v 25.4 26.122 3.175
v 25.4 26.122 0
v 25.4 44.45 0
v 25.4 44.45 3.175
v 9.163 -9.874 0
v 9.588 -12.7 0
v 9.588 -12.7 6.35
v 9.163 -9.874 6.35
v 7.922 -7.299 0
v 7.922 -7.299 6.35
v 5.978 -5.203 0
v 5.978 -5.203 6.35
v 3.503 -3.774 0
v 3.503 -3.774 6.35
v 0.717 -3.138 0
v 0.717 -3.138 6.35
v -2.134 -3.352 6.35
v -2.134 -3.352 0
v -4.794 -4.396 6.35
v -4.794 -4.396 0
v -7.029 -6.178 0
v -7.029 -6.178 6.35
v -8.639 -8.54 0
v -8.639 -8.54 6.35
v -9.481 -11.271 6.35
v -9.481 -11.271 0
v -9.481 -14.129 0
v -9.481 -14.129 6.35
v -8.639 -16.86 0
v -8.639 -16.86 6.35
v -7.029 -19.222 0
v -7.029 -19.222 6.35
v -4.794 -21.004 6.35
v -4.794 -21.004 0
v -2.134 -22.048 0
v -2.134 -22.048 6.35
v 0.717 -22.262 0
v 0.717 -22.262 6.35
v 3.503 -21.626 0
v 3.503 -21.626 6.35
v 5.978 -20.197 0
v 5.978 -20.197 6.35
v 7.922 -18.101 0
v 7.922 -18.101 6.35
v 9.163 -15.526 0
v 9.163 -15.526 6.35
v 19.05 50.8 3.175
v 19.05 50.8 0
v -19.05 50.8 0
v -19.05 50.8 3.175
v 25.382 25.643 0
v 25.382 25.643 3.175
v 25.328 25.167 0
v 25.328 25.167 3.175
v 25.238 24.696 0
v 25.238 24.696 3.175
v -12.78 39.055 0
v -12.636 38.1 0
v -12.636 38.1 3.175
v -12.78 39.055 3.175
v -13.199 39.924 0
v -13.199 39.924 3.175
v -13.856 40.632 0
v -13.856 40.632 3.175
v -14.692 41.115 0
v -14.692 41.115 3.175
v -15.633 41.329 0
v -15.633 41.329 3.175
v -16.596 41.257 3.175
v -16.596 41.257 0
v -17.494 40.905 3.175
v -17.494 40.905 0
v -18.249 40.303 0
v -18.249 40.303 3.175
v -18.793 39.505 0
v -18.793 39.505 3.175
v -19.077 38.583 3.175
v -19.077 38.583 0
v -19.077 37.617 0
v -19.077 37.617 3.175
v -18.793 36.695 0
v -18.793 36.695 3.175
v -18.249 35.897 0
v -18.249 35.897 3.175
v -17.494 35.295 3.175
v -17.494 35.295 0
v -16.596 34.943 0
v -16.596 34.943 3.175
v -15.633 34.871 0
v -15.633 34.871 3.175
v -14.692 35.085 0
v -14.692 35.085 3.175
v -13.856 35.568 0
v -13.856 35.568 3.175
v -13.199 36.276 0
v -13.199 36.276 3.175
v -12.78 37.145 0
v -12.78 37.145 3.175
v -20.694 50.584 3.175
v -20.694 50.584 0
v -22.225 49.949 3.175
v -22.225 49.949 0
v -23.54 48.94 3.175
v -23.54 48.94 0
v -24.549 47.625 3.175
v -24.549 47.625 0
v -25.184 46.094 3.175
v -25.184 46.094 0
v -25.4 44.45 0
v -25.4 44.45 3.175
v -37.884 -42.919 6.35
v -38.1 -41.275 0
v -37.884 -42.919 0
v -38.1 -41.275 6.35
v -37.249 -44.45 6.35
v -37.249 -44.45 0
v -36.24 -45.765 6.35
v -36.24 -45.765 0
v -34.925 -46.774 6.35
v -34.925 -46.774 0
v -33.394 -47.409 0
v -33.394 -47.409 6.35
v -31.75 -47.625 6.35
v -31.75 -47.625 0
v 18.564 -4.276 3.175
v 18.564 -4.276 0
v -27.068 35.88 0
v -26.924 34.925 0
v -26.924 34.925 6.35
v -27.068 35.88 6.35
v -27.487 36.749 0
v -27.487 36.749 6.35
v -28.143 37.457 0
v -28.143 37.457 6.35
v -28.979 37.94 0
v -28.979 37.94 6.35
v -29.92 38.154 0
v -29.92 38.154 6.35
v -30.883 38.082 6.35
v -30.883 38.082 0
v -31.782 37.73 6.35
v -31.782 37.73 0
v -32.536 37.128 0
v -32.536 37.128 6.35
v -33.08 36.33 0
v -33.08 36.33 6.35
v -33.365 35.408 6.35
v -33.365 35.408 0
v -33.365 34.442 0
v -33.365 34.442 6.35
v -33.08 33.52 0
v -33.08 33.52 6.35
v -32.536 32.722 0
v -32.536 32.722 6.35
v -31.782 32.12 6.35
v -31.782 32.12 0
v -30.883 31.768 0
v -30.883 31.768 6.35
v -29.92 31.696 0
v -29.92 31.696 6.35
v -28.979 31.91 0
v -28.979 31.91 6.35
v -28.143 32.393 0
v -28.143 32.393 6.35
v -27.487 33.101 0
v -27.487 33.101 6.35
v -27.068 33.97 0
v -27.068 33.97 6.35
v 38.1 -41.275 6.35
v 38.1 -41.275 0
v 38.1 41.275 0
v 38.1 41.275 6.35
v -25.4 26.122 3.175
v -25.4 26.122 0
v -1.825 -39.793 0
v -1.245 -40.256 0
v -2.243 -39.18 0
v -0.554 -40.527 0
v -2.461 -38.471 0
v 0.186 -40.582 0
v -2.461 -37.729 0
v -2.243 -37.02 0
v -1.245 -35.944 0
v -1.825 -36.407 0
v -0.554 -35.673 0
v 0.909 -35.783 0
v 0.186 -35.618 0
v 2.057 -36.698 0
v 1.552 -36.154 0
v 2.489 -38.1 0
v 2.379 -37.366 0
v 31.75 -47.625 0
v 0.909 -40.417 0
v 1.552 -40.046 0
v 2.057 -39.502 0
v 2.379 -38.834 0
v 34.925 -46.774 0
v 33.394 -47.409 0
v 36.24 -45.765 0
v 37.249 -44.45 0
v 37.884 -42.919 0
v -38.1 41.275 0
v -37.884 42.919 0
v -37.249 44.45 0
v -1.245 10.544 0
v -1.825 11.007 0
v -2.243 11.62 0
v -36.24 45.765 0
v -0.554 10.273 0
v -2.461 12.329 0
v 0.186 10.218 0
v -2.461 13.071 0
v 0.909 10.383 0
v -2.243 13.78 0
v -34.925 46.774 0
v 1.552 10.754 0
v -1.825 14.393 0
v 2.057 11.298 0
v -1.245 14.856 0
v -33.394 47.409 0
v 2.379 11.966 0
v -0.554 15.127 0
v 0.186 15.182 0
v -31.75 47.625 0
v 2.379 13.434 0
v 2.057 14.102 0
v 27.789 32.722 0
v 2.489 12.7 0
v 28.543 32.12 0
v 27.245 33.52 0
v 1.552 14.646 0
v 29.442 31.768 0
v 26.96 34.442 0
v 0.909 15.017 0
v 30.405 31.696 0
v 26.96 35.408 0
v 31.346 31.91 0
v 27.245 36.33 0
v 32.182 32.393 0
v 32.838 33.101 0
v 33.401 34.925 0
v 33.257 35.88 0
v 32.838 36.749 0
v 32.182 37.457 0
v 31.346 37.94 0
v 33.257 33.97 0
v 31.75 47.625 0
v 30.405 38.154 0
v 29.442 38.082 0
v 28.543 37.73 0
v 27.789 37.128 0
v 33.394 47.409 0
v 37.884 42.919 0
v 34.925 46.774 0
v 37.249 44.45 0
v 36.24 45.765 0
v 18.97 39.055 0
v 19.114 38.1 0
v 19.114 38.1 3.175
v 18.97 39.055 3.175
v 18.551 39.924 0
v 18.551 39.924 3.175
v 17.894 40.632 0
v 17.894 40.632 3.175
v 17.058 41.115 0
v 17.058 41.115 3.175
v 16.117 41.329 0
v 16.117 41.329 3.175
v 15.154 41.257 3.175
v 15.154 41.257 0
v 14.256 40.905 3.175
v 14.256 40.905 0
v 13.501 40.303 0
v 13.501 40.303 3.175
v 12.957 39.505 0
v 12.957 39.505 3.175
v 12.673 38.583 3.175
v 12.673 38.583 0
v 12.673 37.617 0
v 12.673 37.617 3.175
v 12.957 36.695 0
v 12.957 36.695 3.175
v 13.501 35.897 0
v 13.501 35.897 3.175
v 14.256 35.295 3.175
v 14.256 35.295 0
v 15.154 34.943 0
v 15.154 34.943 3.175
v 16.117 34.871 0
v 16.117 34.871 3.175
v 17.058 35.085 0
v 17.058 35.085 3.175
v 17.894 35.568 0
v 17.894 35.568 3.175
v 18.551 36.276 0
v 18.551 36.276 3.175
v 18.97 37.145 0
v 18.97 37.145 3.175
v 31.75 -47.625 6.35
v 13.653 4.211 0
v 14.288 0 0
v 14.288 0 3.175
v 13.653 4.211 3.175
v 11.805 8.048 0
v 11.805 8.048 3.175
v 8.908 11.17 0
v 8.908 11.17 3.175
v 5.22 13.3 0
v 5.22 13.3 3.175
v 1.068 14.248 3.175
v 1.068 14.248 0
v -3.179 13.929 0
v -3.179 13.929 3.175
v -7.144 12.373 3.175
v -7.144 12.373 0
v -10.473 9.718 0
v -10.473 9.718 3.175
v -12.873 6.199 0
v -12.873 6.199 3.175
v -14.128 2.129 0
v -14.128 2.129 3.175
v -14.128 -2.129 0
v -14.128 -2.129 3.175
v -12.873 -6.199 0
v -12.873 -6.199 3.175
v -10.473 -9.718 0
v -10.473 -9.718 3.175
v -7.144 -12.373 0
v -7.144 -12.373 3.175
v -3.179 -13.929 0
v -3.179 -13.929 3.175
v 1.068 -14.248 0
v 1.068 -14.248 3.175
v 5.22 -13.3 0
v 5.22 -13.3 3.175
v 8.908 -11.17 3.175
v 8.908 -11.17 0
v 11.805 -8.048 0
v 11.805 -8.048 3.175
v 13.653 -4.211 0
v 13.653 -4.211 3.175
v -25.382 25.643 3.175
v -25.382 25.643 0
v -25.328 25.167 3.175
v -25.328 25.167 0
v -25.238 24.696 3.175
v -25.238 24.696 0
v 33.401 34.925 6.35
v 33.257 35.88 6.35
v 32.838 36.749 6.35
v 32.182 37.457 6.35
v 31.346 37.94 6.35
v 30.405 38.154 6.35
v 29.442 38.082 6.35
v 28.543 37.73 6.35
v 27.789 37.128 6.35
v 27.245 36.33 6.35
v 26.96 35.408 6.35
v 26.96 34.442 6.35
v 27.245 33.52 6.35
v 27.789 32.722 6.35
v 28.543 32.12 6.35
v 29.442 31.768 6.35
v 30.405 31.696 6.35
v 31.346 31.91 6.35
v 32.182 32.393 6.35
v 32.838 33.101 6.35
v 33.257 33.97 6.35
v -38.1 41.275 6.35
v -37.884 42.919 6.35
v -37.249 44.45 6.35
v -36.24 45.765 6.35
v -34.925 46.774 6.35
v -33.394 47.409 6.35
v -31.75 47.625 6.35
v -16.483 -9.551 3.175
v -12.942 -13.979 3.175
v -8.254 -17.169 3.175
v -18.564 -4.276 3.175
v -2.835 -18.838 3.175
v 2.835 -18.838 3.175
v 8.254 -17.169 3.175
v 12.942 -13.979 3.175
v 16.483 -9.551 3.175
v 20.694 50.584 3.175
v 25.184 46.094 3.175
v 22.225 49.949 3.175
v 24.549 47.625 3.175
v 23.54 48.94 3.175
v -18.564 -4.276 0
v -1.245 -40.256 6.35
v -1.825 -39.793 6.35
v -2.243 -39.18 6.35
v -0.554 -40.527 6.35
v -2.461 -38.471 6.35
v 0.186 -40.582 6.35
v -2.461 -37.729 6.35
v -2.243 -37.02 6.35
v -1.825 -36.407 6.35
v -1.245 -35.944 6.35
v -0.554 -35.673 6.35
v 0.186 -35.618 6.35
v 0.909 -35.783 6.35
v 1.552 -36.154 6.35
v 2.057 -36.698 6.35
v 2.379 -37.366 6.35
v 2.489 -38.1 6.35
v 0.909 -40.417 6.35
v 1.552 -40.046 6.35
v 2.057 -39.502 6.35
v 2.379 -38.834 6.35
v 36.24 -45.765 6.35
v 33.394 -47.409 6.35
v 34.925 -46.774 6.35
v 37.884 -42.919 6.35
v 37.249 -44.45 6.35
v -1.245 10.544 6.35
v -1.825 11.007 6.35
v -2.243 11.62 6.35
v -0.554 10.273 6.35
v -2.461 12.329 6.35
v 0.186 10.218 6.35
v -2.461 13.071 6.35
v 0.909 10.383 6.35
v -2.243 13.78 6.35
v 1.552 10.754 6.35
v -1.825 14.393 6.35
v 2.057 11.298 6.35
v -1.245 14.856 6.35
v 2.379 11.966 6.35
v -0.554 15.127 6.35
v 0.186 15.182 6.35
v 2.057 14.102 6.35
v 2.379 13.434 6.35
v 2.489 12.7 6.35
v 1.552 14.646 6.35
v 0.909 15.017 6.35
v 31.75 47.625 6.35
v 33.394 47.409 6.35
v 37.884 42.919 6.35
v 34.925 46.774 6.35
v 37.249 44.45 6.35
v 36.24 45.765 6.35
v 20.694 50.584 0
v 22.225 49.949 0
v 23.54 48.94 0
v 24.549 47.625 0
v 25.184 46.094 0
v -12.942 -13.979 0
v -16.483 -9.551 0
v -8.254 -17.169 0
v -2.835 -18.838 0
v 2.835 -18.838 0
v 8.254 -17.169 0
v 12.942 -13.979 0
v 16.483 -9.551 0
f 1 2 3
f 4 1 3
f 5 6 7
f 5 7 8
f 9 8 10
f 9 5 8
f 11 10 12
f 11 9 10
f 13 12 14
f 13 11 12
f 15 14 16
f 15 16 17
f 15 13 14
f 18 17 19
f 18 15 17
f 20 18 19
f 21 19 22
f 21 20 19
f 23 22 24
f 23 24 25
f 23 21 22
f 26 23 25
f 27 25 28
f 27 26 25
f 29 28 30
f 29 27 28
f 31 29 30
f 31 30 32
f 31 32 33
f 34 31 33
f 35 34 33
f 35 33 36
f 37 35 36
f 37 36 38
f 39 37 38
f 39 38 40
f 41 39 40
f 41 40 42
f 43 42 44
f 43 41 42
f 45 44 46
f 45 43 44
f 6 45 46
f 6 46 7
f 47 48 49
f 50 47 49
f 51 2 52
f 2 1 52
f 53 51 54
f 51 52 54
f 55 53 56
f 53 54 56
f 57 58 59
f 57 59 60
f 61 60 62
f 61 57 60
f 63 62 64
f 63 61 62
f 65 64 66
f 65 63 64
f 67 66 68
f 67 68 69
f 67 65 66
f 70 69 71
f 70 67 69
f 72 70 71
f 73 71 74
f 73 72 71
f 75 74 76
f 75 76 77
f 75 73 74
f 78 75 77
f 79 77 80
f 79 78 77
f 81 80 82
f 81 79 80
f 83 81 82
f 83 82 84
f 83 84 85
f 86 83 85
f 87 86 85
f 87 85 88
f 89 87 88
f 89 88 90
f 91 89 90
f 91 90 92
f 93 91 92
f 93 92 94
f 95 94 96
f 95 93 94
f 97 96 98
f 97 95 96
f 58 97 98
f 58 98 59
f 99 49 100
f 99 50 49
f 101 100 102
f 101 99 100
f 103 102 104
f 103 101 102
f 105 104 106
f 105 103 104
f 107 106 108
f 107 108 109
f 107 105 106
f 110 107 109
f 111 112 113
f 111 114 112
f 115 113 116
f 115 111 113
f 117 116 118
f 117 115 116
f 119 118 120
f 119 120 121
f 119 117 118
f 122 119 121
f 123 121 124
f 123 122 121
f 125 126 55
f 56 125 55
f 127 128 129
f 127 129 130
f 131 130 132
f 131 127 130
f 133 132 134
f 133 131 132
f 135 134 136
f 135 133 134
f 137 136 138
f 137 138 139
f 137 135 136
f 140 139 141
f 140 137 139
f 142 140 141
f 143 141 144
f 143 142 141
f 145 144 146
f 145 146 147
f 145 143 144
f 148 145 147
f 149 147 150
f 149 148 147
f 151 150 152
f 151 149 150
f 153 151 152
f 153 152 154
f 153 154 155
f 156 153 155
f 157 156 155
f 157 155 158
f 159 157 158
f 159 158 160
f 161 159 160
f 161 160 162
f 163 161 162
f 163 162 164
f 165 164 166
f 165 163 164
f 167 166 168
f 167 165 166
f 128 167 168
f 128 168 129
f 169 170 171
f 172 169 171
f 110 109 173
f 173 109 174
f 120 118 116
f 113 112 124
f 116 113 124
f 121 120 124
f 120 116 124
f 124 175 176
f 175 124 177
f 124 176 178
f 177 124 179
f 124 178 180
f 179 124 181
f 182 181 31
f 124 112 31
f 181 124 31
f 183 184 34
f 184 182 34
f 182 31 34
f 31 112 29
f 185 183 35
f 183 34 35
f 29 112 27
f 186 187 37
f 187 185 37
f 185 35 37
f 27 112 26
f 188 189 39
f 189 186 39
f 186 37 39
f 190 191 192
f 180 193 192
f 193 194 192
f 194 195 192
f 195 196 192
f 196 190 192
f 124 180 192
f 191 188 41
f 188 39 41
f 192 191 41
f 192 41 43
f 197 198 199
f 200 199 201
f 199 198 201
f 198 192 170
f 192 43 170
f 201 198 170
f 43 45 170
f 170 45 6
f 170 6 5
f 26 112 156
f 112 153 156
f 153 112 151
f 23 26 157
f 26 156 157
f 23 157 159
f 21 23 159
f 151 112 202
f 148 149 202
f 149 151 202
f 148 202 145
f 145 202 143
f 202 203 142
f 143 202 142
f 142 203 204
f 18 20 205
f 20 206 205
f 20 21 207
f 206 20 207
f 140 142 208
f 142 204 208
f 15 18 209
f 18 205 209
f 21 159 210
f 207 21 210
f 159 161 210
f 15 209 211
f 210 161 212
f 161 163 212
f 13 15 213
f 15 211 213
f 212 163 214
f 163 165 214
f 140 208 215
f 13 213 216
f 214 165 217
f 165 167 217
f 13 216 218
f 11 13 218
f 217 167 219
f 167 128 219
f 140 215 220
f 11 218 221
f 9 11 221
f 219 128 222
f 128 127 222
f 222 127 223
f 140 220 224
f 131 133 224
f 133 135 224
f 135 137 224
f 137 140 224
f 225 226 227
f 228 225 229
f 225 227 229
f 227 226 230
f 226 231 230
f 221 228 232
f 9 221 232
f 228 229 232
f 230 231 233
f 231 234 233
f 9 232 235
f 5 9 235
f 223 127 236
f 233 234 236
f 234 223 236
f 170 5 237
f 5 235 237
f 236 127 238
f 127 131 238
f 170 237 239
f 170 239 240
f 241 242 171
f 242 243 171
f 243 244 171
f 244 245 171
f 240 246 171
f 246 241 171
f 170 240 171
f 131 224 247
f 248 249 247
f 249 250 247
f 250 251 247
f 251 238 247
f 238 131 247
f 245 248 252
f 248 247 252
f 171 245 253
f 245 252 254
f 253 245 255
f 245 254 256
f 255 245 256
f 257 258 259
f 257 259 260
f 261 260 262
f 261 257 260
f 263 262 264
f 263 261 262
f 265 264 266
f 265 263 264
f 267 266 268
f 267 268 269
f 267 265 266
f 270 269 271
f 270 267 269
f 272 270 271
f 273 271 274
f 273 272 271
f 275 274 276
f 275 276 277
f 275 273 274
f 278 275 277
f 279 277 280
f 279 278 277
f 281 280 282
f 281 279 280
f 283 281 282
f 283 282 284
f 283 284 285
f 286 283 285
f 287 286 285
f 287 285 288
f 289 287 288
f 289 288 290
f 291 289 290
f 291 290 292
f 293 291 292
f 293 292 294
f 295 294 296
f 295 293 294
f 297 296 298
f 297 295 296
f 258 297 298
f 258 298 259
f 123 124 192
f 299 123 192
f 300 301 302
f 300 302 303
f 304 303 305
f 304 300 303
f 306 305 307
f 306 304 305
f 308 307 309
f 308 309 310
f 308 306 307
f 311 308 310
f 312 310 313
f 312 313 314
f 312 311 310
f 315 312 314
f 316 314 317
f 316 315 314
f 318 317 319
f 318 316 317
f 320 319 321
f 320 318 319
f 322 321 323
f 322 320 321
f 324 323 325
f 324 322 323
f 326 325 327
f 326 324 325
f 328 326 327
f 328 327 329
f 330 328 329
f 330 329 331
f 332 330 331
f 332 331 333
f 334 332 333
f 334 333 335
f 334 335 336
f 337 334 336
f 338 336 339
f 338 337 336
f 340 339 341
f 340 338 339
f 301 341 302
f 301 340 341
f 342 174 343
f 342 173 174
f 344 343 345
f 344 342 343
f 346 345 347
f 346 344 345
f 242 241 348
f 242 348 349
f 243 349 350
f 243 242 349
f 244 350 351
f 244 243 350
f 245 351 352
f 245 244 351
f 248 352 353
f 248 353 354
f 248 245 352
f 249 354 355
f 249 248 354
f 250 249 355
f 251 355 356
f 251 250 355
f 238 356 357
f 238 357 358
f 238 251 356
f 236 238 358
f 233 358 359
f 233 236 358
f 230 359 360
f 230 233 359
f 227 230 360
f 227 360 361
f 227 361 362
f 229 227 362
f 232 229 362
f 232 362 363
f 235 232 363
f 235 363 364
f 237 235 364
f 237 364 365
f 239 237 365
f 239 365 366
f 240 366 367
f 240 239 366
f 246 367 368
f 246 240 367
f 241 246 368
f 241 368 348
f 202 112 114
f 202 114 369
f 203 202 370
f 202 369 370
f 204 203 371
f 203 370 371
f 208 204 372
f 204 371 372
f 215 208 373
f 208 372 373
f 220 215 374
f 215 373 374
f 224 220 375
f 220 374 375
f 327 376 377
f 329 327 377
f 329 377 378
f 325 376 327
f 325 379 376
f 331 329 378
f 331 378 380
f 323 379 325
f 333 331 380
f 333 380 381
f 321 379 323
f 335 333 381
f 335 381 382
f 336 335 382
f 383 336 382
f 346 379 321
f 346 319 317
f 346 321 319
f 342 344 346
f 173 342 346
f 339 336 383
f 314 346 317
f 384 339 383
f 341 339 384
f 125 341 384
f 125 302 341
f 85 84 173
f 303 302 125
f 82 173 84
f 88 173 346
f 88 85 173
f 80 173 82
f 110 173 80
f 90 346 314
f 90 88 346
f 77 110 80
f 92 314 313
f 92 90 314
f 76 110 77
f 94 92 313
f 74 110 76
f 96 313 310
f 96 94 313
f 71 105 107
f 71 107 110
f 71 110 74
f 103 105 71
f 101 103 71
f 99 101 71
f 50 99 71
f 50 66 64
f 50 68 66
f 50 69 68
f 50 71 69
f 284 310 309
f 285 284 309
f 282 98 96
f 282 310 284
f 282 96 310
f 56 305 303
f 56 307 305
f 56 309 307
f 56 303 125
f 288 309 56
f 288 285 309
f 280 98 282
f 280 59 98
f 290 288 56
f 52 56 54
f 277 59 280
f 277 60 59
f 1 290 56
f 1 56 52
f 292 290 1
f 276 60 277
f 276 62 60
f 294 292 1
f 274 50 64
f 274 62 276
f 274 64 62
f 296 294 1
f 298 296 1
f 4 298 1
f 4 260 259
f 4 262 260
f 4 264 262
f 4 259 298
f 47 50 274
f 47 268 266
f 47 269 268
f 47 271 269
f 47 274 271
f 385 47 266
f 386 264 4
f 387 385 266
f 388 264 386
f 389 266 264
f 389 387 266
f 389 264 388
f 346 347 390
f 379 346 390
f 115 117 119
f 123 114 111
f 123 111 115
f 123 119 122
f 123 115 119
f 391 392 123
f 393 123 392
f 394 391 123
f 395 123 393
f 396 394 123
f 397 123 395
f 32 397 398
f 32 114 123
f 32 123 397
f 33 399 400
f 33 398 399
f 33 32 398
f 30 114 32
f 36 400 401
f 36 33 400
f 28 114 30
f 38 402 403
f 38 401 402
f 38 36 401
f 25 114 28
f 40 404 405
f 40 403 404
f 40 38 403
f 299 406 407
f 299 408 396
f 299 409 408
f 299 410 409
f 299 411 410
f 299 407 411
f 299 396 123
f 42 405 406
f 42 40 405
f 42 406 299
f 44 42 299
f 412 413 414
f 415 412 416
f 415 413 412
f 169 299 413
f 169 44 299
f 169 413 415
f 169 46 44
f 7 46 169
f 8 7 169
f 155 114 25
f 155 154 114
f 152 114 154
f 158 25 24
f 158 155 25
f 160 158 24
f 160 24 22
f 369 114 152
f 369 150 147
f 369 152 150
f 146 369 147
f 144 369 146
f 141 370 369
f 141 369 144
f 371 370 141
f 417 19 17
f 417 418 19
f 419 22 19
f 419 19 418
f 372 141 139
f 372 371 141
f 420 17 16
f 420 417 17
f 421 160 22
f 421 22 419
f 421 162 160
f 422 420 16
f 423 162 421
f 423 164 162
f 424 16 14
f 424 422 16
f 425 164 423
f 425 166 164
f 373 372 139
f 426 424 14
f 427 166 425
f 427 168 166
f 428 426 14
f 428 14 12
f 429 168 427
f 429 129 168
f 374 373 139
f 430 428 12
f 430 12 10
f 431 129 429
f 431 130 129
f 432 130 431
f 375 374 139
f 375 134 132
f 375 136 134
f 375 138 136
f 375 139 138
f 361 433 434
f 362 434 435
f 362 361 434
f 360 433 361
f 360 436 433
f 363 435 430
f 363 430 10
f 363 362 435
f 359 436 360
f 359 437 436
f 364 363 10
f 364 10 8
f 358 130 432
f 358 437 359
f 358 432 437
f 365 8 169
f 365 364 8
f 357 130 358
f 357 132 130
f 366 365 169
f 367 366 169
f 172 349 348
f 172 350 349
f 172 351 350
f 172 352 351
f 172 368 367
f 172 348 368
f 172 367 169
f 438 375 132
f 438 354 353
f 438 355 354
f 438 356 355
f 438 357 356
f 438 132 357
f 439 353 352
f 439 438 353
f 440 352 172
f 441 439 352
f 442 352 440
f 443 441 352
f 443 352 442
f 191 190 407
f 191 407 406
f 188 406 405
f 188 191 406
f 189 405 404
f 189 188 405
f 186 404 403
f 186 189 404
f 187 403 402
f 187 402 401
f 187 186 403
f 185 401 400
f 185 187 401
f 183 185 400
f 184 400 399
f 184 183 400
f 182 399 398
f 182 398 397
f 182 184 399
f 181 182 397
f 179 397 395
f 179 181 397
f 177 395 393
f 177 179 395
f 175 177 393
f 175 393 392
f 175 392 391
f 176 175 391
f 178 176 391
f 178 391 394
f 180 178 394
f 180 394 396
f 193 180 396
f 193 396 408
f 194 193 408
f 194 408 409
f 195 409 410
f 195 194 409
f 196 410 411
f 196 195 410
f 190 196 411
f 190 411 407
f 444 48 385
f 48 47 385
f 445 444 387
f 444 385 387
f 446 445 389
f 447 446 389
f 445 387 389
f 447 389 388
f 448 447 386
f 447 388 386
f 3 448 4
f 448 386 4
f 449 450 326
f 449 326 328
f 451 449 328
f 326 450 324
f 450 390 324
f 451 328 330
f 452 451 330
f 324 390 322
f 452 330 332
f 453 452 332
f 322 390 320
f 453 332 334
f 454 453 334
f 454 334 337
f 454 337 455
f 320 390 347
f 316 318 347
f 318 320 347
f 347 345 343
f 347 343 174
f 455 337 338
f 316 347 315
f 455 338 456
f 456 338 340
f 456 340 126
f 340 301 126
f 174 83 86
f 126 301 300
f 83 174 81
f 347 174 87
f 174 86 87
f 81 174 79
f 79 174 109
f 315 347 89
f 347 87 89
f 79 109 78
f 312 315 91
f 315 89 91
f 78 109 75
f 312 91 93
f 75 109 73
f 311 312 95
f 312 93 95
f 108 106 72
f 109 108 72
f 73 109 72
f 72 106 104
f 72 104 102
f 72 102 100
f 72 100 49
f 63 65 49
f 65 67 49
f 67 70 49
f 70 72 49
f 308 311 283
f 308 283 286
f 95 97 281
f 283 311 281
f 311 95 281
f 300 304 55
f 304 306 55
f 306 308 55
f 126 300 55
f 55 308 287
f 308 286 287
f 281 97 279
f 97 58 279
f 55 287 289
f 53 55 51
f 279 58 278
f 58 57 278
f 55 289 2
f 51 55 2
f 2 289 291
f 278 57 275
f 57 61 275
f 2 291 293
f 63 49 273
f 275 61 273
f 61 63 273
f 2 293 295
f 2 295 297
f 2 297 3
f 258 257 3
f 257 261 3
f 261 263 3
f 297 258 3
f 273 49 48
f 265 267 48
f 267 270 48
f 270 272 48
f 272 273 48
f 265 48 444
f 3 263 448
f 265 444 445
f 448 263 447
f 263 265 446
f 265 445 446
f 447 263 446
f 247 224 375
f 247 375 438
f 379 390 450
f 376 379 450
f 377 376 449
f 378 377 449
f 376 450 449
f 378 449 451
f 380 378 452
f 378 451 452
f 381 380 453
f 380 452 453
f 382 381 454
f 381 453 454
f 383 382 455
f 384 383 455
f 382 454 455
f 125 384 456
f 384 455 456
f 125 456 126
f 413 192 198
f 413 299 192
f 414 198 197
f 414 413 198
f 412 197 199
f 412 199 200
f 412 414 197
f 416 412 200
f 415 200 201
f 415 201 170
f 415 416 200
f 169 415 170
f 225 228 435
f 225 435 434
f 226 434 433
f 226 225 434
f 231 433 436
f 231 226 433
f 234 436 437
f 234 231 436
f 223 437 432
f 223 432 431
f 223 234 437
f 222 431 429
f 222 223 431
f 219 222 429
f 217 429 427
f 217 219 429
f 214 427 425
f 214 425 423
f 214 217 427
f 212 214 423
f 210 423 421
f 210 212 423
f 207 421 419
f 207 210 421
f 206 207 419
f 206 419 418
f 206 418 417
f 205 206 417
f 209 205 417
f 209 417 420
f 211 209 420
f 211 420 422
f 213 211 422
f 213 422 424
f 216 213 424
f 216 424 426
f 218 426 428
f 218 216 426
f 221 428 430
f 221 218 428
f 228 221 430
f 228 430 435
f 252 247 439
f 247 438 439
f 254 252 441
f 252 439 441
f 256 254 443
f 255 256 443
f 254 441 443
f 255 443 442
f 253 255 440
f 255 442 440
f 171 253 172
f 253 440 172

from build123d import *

# Parameters (mm, degrees)
F0_W     = 76.2
F0_H     = 95.25
F0_R     = 2.4892
F0_R_2   = 9.5885
F0_R_3   = 3.2385
F1_DEPTH = 6.35
F2_R     = 6.35
F3_R     = 14.2875
F3_R_2   = 3.2385
F4_DEPTH = 3.175
F5_R     = 6.35


with BuildPart() as f1:
    # F0 (on Top) → F1 (new body)
    with BuildSketch(Plane.XY):
        Rectangle(F0_W, F0_H)
        with Locations((0, -38.1)):
            Circle(F0_R, mode=Mode.SUBTRACT)
        with Locations((0, -12.7)):
            Circle(F0_R_2, mode=Mode.SUBTRACT)
        with Locations((-30.1625, 34.925)):
            Circle(F0_R_3, mode=Mode.SUBTRACT)
        with Locations((0, 12.7)):
            Circle(F0_R, mode=Mode.SUBTRACT)
        with Locations((30.1625, 34.925)):
            Circle(F0_R_3, mode=Mode.SUBTRACT)
    extrude(amount=F1_DEPTH)

    # F2
    f2_edges = [f1.edges().sort_by_distance(p)[0] for p in [
        (-38.1, 47.625, 3.175),
        (-38.1, -47.625, 3.175),
        (38.1, -47.625, 3.175),
        (38.1, 47.625, 3.175),
    ]]
    fillet(f2_edges, radius=F2_R)


with BuildPart() as f4:
    # F3 (on Top) → F4 (new body)
    with BuildSketch(Plane.XY):
        with BuildLine():
            Line((25.4, 50.8), (-25.4, 50.8))
            Line((-25.4, 50.8), (-25.4, 25.4))
            Line((-25.4, 25.4), (-18.563824, -4.276324))
            ThreePointArc((-18.563824, -4.276324), (0, -19.05), (18.563824, -4.276324))
            Line((18.563824, -4.276324), (25.4, 25.4))
            Line((25.4, 25.4), (25.4, 50.8))
        make_face()
        Circle(F3_R, mode=Mode.SUBTRACT)
        with Locations((-15.875, 38.1)):
            Circle(F3_R_2, mode=Mode.SUBTRACT)
        with Locations((15.875, 38.1)):
            Circle(F3_R_2, mode=Mode.SUBTRACT)
    extrude(amount=F4_DEPTH)

    # F5
    f5_edges = [f4.edges().sort_by_distance(p)[0] for p in [
        (25.4, 50.8, 1.5875),
        (25.4, 25.4, 1.5875),
        (-25.4, 25.4, 1.5875),
        (-25.4, 50.8, 1.5875),
    ]]
    fillet(f5_edges, radius=F5_R)


solid = Compound([f1.part, f4.part])
